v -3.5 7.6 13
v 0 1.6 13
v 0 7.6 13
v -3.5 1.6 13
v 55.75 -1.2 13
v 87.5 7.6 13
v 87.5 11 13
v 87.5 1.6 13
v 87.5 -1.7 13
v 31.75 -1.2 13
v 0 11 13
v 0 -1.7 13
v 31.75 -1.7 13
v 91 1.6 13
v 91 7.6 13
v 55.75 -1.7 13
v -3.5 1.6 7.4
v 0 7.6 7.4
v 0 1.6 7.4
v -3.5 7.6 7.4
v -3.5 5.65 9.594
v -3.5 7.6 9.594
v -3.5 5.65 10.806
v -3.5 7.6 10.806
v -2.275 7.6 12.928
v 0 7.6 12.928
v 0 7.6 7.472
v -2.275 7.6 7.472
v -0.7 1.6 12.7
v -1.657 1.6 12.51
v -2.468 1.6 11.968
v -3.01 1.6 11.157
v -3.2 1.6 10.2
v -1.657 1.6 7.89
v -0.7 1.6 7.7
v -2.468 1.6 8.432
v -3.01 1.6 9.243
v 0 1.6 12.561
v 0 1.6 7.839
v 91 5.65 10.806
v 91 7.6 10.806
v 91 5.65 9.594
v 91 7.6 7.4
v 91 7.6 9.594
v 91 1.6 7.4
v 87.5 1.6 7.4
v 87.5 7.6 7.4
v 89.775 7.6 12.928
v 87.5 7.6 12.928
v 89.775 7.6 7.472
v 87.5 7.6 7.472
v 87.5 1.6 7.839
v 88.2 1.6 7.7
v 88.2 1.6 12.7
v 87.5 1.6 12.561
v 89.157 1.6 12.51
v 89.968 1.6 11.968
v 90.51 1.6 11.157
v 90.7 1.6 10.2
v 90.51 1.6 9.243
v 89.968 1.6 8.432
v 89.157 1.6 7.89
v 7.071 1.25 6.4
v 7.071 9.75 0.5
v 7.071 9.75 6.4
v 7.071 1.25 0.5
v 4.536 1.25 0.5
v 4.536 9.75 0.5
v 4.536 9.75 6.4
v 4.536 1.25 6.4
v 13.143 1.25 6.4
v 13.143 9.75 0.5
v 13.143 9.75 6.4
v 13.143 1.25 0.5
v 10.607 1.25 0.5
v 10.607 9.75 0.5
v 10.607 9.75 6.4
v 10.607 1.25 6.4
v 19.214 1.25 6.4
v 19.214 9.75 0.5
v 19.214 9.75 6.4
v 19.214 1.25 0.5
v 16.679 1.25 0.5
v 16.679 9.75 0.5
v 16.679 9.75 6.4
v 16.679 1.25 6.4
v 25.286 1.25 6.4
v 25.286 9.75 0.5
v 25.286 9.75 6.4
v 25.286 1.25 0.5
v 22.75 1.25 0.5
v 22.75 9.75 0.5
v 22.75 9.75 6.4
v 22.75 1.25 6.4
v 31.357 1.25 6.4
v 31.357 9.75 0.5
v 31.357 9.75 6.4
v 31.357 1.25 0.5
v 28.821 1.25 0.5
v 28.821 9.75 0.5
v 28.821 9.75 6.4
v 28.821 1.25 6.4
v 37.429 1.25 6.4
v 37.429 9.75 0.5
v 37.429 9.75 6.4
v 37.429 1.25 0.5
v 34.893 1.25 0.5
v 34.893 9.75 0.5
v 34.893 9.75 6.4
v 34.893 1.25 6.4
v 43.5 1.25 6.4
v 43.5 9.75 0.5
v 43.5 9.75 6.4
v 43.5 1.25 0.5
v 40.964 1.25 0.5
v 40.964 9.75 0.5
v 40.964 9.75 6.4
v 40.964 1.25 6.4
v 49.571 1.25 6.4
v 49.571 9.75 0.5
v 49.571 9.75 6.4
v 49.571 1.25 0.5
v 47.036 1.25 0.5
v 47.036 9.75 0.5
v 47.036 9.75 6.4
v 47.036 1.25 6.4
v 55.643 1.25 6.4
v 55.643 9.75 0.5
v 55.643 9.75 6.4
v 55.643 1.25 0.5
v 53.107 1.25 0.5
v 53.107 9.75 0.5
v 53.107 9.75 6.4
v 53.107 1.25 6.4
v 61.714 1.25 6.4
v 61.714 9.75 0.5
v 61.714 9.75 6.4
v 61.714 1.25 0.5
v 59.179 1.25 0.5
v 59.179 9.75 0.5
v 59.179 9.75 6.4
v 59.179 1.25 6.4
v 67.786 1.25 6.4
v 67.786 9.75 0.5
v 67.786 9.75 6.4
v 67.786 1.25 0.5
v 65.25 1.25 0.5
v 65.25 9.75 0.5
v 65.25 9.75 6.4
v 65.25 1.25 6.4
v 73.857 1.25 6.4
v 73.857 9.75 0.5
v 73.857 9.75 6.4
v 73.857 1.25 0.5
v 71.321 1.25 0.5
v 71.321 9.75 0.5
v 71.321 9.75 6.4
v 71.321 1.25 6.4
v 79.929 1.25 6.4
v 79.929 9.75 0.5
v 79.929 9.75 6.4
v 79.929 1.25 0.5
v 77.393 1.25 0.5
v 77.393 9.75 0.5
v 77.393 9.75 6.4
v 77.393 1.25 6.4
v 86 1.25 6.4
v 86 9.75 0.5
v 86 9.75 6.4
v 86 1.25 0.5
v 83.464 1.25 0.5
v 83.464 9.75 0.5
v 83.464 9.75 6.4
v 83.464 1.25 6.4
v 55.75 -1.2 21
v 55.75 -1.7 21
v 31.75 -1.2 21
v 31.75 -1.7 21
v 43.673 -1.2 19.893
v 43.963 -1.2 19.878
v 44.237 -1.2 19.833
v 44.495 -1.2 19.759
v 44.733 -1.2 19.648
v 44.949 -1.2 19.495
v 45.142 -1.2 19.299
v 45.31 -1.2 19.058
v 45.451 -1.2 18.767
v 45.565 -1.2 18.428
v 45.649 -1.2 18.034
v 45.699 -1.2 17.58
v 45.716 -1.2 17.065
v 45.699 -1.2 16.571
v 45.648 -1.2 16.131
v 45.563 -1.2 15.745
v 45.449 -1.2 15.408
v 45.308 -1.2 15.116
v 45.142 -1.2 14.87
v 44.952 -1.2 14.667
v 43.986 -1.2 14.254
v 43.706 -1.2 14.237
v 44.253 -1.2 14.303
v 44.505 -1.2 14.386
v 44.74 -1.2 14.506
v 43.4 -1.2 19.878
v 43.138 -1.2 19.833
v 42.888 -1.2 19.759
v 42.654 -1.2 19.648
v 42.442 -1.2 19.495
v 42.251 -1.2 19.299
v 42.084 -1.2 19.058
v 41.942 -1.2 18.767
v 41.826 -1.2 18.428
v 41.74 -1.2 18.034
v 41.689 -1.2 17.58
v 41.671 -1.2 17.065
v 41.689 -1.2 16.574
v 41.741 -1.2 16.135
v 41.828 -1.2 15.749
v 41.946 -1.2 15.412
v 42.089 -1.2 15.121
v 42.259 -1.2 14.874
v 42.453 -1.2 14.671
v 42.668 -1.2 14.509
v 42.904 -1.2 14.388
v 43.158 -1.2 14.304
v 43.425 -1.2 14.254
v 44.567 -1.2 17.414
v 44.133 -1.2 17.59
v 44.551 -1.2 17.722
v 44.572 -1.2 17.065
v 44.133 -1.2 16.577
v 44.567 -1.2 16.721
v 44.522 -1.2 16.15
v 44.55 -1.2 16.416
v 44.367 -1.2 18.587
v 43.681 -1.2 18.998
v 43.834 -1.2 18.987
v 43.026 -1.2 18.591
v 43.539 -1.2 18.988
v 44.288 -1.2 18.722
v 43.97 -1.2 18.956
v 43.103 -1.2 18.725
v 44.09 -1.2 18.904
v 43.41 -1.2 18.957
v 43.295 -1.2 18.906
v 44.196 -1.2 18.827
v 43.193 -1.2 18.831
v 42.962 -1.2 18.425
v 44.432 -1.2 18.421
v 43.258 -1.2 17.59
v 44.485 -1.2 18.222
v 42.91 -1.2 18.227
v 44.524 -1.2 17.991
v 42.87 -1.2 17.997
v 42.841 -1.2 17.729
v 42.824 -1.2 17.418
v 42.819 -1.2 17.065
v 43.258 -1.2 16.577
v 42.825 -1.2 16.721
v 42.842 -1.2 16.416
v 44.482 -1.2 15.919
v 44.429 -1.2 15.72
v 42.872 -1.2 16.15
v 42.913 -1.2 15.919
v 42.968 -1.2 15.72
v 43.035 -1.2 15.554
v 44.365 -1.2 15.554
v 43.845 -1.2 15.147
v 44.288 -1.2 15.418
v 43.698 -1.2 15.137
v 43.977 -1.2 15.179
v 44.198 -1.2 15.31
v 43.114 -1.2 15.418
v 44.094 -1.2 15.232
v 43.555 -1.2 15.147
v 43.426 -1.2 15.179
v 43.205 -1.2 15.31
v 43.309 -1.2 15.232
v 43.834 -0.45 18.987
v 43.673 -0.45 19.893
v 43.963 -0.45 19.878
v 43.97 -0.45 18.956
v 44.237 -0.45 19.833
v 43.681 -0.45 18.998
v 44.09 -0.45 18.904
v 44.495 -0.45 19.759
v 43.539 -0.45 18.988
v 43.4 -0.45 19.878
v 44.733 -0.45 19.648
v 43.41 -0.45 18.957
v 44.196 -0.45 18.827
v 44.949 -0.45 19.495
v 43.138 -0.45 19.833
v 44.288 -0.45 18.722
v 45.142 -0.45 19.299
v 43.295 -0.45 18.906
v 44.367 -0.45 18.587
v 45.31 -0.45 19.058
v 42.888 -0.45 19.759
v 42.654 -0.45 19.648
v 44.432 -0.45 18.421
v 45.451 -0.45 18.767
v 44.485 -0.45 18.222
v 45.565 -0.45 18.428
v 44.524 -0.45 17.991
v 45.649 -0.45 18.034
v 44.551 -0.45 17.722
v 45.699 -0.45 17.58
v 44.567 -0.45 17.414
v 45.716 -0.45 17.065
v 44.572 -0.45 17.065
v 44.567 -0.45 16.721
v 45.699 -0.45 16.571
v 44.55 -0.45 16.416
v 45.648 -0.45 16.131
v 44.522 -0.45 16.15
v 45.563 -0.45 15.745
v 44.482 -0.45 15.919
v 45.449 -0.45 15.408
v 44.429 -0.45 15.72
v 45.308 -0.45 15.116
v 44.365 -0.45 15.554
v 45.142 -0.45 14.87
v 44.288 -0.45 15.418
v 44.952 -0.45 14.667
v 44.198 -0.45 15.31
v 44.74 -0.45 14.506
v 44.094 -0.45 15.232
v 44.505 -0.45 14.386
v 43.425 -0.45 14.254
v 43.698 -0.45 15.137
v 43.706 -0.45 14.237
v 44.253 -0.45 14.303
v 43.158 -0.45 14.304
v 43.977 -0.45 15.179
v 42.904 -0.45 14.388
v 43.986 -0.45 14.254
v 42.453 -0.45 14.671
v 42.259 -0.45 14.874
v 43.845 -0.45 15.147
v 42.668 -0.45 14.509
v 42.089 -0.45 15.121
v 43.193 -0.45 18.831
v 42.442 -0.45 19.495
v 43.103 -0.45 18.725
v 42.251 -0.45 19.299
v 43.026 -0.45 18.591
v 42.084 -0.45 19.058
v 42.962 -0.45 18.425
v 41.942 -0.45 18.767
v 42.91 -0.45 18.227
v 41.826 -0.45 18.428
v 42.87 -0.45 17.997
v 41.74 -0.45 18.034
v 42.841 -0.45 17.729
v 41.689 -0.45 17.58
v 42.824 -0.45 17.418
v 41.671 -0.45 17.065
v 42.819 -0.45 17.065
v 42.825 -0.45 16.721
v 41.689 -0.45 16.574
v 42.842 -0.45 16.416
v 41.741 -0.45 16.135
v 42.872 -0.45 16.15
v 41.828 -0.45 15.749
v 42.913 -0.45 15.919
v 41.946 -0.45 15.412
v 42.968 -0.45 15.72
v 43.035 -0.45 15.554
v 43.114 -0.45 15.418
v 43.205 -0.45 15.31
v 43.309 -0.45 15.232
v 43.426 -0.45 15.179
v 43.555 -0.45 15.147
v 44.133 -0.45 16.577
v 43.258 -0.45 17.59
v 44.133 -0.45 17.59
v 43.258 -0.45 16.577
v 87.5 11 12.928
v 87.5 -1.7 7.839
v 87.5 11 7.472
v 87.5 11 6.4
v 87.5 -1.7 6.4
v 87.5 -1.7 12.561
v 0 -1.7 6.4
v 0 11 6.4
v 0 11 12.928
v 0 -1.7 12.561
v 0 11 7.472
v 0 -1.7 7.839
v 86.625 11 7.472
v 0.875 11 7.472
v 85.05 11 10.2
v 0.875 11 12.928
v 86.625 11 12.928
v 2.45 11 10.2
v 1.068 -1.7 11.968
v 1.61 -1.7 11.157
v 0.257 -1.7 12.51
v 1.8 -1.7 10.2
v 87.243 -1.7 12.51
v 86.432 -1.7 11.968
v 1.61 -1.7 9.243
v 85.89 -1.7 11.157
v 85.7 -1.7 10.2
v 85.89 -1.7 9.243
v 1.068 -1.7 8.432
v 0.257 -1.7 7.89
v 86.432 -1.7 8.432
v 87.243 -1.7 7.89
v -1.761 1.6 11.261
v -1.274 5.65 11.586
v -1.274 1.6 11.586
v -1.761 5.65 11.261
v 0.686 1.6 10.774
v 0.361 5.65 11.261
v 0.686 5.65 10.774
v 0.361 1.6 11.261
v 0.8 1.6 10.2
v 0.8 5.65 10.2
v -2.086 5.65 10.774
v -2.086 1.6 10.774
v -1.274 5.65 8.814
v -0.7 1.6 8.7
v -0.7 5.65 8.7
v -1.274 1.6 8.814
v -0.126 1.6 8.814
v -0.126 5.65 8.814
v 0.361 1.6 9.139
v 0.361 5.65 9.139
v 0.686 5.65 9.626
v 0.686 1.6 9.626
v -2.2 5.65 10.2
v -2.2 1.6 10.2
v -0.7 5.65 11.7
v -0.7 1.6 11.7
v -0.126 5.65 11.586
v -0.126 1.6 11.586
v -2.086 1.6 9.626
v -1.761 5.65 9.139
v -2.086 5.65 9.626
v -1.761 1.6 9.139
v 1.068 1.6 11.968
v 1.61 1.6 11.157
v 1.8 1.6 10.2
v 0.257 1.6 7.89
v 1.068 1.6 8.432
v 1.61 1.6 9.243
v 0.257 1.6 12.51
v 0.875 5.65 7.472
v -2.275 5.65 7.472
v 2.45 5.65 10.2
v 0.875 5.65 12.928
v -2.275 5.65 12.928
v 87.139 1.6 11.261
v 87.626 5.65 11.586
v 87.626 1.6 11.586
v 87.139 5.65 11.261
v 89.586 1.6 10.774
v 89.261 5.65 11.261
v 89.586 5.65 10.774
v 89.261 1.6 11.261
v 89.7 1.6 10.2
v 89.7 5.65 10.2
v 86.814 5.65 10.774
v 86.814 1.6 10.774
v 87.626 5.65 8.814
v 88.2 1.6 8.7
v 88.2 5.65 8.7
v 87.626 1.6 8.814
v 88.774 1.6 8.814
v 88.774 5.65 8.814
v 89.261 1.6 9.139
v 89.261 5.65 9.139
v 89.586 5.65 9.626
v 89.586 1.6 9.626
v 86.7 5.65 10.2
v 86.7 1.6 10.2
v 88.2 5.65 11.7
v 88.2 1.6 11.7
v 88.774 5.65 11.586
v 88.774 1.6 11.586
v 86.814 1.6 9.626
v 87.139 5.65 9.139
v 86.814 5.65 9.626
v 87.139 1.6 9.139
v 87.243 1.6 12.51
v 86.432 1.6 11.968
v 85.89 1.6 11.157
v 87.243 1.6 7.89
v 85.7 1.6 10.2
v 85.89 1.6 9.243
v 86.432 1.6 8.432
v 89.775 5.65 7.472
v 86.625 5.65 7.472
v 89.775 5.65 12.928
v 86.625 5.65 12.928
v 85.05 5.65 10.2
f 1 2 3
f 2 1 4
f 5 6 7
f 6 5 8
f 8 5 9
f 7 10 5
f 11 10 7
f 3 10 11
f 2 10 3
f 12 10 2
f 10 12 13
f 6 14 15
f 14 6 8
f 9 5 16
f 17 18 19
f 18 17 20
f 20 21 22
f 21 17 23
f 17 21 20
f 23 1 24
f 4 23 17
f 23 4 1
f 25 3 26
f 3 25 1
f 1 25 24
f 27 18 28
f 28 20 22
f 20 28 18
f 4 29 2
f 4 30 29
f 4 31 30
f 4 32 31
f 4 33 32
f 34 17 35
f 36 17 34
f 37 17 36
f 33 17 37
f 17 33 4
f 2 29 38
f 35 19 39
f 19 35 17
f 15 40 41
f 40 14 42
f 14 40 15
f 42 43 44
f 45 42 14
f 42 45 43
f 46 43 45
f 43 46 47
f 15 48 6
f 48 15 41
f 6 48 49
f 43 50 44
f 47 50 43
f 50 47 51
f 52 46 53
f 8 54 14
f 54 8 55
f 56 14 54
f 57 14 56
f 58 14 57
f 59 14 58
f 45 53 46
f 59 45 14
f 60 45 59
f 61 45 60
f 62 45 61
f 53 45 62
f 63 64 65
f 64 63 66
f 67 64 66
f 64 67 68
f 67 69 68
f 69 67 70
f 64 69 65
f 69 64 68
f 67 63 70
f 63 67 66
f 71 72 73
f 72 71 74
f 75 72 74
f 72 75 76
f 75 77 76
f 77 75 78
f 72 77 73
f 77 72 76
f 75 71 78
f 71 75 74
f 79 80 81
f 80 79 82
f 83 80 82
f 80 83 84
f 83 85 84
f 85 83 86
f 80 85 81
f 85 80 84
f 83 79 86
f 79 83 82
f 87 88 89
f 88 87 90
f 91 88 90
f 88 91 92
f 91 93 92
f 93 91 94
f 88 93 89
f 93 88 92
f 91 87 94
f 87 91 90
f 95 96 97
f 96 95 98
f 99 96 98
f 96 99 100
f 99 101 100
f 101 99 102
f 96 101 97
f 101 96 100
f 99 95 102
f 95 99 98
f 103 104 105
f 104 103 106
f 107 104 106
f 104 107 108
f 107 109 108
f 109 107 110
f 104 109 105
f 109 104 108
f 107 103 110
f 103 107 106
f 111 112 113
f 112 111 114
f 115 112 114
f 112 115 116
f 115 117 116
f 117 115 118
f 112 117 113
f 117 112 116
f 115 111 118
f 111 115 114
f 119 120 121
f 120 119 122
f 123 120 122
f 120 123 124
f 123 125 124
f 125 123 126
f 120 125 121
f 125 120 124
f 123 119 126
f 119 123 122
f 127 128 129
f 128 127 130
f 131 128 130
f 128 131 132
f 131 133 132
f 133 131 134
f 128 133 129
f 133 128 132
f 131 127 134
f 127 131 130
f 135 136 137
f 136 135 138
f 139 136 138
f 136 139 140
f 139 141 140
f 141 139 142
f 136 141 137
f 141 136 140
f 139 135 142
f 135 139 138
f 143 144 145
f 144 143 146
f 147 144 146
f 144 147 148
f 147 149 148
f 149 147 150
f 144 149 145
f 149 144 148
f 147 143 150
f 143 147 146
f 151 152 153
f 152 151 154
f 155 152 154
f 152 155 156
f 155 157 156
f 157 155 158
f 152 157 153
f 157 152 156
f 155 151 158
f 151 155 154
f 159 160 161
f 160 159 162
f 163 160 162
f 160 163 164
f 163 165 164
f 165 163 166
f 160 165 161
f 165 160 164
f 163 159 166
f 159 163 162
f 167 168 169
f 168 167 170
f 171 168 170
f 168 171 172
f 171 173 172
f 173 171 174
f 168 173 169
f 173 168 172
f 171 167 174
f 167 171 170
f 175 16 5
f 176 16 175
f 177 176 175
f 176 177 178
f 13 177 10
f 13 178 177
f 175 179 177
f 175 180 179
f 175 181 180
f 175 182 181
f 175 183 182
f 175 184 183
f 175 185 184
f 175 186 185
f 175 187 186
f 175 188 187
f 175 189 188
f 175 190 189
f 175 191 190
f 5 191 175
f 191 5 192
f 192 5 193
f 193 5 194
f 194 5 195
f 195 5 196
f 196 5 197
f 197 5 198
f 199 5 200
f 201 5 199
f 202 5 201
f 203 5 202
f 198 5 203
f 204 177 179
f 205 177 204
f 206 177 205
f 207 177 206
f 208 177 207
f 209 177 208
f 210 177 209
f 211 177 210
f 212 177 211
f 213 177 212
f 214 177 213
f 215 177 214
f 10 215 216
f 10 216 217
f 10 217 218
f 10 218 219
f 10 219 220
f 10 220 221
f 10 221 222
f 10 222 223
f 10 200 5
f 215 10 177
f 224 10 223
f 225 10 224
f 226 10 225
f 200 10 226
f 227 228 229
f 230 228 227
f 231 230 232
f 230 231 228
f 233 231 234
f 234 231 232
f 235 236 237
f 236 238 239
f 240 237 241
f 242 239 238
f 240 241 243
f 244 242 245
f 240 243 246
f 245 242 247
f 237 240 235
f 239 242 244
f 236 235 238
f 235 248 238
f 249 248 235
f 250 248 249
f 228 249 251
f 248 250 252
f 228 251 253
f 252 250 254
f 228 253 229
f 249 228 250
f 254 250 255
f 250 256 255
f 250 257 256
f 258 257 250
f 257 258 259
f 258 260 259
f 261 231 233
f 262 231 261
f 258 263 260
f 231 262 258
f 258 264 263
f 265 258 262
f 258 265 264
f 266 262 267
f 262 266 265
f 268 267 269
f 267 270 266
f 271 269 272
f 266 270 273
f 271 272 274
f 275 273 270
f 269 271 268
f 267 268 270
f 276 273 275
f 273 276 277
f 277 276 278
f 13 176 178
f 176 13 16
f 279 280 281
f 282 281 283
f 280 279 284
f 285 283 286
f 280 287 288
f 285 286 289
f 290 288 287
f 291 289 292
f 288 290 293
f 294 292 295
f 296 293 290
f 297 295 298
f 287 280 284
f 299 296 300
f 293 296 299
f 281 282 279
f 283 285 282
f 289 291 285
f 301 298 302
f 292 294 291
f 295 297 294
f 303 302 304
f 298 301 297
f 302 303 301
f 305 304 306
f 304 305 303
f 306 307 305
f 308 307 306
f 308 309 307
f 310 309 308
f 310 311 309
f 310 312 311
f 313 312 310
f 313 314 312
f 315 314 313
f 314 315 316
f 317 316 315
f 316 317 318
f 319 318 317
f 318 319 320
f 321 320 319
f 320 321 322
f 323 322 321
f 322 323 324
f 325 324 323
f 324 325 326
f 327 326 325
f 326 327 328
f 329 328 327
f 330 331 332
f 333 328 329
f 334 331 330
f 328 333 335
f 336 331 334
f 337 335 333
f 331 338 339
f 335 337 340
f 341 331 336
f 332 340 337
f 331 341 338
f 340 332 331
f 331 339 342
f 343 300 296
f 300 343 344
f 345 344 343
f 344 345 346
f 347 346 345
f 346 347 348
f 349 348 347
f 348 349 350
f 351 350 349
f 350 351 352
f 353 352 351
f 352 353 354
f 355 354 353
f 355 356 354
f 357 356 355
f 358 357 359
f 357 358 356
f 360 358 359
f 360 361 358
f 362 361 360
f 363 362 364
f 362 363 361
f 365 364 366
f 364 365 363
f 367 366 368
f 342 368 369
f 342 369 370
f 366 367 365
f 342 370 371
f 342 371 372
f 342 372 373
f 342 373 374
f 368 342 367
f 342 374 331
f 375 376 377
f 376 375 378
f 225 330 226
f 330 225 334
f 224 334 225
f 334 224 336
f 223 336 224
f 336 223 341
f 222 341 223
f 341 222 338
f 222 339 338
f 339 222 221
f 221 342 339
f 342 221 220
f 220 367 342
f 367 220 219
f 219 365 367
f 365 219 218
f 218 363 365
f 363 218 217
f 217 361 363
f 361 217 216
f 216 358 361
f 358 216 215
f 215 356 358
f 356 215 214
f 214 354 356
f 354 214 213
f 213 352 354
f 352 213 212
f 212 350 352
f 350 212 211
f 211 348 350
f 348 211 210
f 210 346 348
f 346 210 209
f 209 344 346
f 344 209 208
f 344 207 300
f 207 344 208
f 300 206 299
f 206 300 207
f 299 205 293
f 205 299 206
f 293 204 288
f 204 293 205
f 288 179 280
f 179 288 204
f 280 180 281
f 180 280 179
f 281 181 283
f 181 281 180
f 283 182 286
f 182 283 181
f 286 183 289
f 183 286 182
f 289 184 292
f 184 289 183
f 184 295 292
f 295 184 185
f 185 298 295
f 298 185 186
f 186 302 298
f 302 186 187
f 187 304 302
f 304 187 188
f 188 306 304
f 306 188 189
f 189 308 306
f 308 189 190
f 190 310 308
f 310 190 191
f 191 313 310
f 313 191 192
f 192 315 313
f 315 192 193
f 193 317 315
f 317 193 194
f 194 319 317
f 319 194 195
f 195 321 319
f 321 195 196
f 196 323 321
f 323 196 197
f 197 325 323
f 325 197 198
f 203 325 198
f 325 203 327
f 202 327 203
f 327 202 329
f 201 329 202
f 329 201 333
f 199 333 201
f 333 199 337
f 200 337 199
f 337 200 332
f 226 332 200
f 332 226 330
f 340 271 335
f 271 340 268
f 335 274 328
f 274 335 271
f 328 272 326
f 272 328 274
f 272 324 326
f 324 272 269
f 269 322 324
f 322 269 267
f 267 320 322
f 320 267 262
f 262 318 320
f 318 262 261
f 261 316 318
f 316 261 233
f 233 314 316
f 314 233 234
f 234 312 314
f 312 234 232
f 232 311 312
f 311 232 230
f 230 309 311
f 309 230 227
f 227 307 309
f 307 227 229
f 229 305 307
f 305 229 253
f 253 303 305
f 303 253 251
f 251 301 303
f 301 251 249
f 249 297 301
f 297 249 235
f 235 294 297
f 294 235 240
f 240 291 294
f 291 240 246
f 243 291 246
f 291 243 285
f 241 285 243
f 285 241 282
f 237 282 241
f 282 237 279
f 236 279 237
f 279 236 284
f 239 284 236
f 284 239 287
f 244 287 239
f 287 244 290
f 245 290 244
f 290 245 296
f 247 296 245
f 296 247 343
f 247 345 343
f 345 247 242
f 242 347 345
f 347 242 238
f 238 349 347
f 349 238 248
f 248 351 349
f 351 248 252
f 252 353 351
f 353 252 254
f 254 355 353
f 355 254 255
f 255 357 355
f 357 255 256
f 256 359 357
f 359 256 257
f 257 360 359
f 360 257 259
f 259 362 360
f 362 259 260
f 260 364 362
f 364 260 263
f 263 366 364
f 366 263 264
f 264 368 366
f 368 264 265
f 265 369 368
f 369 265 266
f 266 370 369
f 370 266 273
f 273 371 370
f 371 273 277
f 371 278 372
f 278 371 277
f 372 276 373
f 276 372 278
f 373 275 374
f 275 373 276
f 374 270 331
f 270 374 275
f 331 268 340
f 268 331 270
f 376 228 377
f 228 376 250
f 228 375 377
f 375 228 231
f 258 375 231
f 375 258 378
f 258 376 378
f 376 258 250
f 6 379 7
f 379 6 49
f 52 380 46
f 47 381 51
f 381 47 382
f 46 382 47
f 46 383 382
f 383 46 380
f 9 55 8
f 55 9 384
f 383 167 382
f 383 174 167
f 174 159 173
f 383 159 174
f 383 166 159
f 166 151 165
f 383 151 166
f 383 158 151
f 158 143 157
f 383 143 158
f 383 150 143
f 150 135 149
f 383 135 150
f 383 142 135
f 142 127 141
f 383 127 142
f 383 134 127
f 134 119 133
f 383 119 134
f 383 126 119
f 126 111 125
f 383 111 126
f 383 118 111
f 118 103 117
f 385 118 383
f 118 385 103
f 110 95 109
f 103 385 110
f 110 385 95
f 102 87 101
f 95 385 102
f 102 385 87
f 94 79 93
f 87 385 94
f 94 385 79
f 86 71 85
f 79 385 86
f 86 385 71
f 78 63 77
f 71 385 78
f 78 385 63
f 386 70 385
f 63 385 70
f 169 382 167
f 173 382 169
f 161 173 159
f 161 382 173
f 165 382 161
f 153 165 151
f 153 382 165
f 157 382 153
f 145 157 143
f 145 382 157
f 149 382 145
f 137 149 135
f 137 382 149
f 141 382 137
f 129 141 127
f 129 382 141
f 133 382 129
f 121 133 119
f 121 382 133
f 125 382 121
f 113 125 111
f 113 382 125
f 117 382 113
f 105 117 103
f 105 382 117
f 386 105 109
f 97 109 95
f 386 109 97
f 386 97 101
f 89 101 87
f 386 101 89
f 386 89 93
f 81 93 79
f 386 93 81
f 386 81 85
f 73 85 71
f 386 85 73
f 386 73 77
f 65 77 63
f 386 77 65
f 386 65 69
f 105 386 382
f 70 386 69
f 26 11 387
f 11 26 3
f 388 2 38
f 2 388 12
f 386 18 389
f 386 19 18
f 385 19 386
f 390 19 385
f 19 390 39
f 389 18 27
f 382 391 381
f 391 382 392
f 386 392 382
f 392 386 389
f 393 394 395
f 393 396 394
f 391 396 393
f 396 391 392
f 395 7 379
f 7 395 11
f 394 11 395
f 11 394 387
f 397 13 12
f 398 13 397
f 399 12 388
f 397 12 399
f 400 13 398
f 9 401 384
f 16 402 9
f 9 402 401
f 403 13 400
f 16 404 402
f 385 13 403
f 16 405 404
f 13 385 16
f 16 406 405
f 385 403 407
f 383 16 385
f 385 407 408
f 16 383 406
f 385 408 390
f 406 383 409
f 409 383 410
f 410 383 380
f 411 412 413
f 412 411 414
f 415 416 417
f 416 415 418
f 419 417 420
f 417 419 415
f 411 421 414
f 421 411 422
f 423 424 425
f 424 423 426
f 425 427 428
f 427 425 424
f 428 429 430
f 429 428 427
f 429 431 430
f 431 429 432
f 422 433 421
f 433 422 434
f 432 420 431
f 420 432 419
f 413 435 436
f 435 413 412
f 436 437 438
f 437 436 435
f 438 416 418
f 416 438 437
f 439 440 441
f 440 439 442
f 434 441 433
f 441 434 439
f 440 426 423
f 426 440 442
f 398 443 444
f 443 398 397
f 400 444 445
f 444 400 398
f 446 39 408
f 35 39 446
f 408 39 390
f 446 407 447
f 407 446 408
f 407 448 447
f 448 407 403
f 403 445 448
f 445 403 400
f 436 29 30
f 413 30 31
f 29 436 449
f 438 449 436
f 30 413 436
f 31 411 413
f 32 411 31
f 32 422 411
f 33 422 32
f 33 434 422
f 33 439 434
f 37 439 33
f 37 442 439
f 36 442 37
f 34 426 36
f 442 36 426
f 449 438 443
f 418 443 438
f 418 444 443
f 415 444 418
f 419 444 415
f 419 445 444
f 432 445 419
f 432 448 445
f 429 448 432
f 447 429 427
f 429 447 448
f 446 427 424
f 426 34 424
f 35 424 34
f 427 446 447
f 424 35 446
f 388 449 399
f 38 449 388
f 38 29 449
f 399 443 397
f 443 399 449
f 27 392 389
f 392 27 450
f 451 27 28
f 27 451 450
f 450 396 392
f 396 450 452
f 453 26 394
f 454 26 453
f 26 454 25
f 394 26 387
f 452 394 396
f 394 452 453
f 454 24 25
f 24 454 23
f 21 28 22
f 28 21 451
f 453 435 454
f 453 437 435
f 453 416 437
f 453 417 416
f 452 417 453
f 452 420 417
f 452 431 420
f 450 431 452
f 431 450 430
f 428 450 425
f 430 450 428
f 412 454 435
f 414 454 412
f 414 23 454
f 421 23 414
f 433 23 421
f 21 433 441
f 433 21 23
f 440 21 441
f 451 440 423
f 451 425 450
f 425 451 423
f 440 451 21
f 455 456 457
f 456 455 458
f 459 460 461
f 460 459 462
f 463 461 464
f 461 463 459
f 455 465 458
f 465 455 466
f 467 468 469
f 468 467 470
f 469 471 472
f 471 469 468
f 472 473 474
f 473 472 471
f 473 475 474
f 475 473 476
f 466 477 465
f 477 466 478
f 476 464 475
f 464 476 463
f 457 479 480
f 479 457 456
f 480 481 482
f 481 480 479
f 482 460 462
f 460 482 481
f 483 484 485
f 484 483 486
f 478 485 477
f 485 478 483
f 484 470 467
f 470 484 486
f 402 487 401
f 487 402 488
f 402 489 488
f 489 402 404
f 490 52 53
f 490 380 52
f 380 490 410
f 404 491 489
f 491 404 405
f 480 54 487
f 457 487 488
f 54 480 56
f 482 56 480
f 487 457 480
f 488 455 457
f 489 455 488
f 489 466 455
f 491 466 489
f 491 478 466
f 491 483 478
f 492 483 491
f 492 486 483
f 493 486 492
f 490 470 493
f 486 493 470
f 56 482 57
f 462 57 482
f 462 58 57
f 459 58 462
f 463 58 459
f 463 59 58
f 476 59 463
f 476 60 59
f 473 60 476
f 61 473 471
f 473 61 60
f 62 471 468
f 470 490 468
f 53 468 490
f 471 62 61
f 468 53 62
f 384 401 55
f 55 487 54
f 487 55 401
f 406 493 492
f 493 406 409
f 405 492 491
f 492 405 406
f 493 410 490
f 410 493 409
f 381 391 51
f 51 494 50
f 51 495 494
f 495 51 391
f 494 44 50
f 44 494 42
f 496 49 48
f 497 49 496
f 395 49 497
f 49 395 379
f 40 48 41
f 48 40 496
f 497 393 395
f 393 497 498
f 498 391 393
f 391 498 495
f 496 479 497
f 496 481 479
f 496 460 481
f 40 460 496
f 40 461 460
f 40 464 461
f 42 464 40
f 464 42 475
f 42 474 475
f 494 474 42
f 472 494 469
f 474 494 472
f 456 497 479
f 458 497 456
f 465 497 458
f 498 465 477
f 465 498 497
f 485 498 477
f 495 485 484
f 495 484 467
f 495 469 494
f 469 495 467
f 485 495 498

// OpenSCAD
// file: ../code/code.scad
// code stripes 
//
// to do:
// - convert code in bits using loop, if possible with scad
// - consider other forms than cubes (why not characters?)

include <code_dim.scad>

module code_label(code=0,type=0){
 code_str=str(code);   
 if(type==0)   
 cube([label_width,label_thick,label_height],center=true);            
 rotate([90,0,180])linear_extrude(height = label_text_thick) 
 text(code_str,
    font = "Courier:style=Bold",
    size=label_size,
    halign ="center",
    valign ="center");
}

module code_stripe(code=code,s=[100,8,10],inv=0){
       
 bit_x=s.x/code_n/2; // x dimension of half bit without pass considered   
    
 function bit(inv=0,bit=0,x=0)=(inv==0)
  ?bit_x*(2*x+bit+1/2)
  :bit_x*(((bit+1)%2)+2*x+1/2);  ;  
  
 function zpos(inv=0)=(inv==0)
  ?s.z/2-pass/2
  :s.z/2+pass/2;        
          
 function get_bit(x=0)=((x%2)==0)? 0:1;
 function get_rest(x=0)=floor(x/2);  
 function p(x)=pow(2,x);
 
 // since variables can not be overwritten in OpenSCAD as required in lops 
 // individual variables per bits are created     
 d13=floor((code                                                                                                                )/p(13));
 d12=floor((code-d13*p(13)                                                                                                      )/p(12));     
 d11=floor((code-d13*p(13)-d12*p(12)                                                                                            )/p(11));         
 d10=floor((code-d13*p(13)-d12*p(12)-d11*p(11)                                                                                  )/p(10));
 d9 =floor((code-d13*p(13)-d12*p(12)-d11*p(11)-d10*p(10)                                                                        )/p(9));          
 d8 =floor((code-d13*p(13)-d12*p(12)-d11*p(11)-d10*p(10)-d9*p(9)                                                                )/p(8));       
 d7 =floor((code-d13*p(13)-d12*p(12)-d11*p(11)-d10*p(10)-d9*p(9)-d8*p(8)                                                        )/p(7));    
 d6 =floor((code-d13*p(13)-d12*p(12)-d11*p(11)-d10*p(10)-d9*p(9)-d8*p(8)-d7*p(7)                                                )/p(6));     
 d5 =floor((code-d13*p(13)-d12*p(12)-d11*p(11)-d10*p(10)-d9*p(9)-d8*p(8)-d7*p(7)-d6*p(6)                                        )/p(5));          
 d4 =floor((code-d13*p(13)-d12*p(12)-d11*p(11)-d10*p(10)-d9*p(9)-d8*p(8)-d7*p(7)-d6*p(6)-d5*p(5)                                )/p(4));       
 d3 =floor((code-d13*p(13)-d12*p(12)-d11*p(11)-d10*p(10)-d9*p(9)-d8*p(8)-d7*p(7)-d6*p(6)-d5*p(5)-d4*p(4)                        )/p(3));   
 d2 =floor((code-d13*p(13)-d12*p(12)-d11*p(11)-d10*p(10)-d9*p(9)-d8*p(8)-d7*p(7)-d6*p(6)-d5*p(5)-d4*p(4)-d3*p(3)                )/p(2));        
 d1 =floor((code-d13*p(13)-d12*p(12)-d11*p(11)-d10*p(10)-d9*p(9)-d8*p(8)-d7*p(7)-d6*p(6)-d5*p(5)-d4*p(4)-d3*p(3)-d2*p(2)        )/p(1));   
 d0 =floor((code-d13*p(13)-d12*p(12)-d11*p(11)-d10*p(10)-d9*p(9)-d8*p(8)-d7*p(7)-d6*p(6)-d5*p(5)-d4*p(4)-d3*p(3)-d2*p(2)-d1*p(1))/p(0));   

 d=[d0,d1,d2,d3,d4,d5,d6,d7,d8,d9,d10,d11,d12,d13];
       
 for (x = [ 0 : code_n - 1 ]) {    
    translate([bit(inv,d[x],x),
                   0,
                   zpos(inv)])
    
    cube([bit_x-pass, 
              s.y,
              s.z-pass],
             center=true);    // coded bits
      
    if(       ((d[x]==0)&&(d[x-1]==1)&&(inv==0))  
           ||  ((d[x]==1)&&(d[x-1]==0)&&(inv==1))  )
        {
          translate([x*bit_x*2,
                        0,
                        zpos(inv)])
          cube([pass*2,s.y,s.z-pass],center=true);  // fillers for not necessary pass gaps
    }
 }    
}

//
code=218;
//code=0;
//code=pow(2,code_n)-1;
s=[100,8,10];

//
color("Red")
code_stripe(code=code,s=s,inv=0);
//
color("Blue")
code_stripe(code=code,s=s,inv=1);

//translate([0,0,20])code_label(code=code,type=1);
// file: ../linurs/linurs_screw.scad
// Metric screws and nuts 
// urs@linurs.org 2019
// It is targeted for 3D printing applications. 
// To look realistic is not the goal (Example: Nuts do not have a hole)

include <linurs_screw_dim.scad>

// Changes
//2019-02-09 split in two files
//2017-05-19 bug fix hexbolt had wrong diameter
//2017-01-22 bug fix lentgh of hex scre is outer lenght as other screw types
//2017-01-06 added hex screw
//2015-10-12 added screw_cut
//2015-11-29 screw_fix parameter sunk added, and module hex_bolt

// Consistent parameters in this file
// d screw diameter M2_5, M3, ... (enumeration with screw_d)
// t millimeters added to diameters 
//   For the screw, head, nut = 0. 
//   For the piece where the screw, nut, ... passes through = 0.5 so it slides in well

// functions used multiple times to position nuts and heads
function headh_cyl(d)=screw_cyl[d][1];  // height of cyl screw head
function headh_cnt(d)=screw_cyl[d][1];  // height of cnt screw head
function headh(d,type=head_cyl)=(type==head_cyl ? headh_cyl(d) : (type==head_cnt ? headh_cnt(d) : 0 )); // height of screw head 

function nuth(d)=screw_hex[d][2];   // height of hex nut

// head of a cylinder screw
module screw_head_cyl(d=M3, t=0)
{
  screwhd=screw_cyl[d][0]+t; // diameter of cylinder screw head
  cylinder(d=screwhd,h=headh(d=d, type=head_cyl), center=true,$fn=16); // screw head
}

// head of a countersunk screw
module screw_head_cnt(d=M3, t=0)
{
  screwd=screw_d[d]+t; 
  screwhd=screw_cnt[d][0]+t; // diameter of cylinder screw head
  cylinder(d1=screwd,d2=screwhd,h=headh(d=d,type=head_cnt), center=true,$fn=16); // screw head
}

// head of a hex screw
module screw_head_hex(d=M3, t=0)
{
    translate([0,0,-nuth(d)/2])nut(d=d, t=t);
}

// head of all screws
module screw_head(d=M3, type=head_cyl, t=0)
{ 
  if(type==head_cnt){
    screw_head_cnt(d=d, t=t);
  } else {
    if(type==head_cyl){
      screw_head_cyl(d=d, t=t);
    } else {
       if(type==head_hex){
           screw_head_hex(d=d, t=t); 
       } 
    }    
  }
}

// hex bolt 
module hex_bolt(d=M3, h=10, t=0)
{
  nutd=screw_hex[d][1]+t; // outer diameter of hex bolt
  cylinder(r=nutd/2,h=h+t, center=true,$fn=6); // nut
}

// nut 
module nut(d=M3, t=0)
{
  hex_bolt(d=d, h=nuth(d), t=t);    
}

// screw 
// w outer width of the screw = screw length + head 
module screw(w=10, d=M3, type=head_cyl, t=0){
  screwd=screw_d[d]+t;       // screw diameter
  cylinder(d=screwd, h=w, center=true,$fn=16); // screw thread length
  translate([0,0,w/2-headh(d=d,type=type)/2])
  screw_head(d=d,type=type, t=t);
}

// screw fix
// w outer width of the screw = screw length + head 
// sink additional material below to remove 
// raise additional material above to remove
module screw_fix(w=10, d=M3, type=head_cyl, sink=0, raise=0, t=0){
  screw(w=w-sink*2, d=d, type=type, t=t);
  translate([0,0,-(w-sink*2)/2+nuth(d)/2])
    nut(d=d,t=t);
  //additional material to be removed above the nut  
  translate([0,0,-(w-sink+raise)/2])hex_bolt(d=d,h=sink+raise+0.01,t=t);    
  //additional material to be removed above the screw head
  if(type==head_cnt){  
    translate([0,0,(w-sink+raise)/2])
    cylinder(d=screw_cnt[d][0]+t,h=sink+raise+0.01,center=true,$fn=16);
  }else{ 
    translate([0,0,(w-sink+raise)/2])
    cylinder(d=screw_cyl[d][0]+t,h=sink+raise+0.01,center=true,$fn=16);
  }     
}
//screw_fix();
//translate([10,0,0])screw_fix(sink=2,type=head_cnt);
//

// screw cut
// material to be extracted from object to slide in a counter sunk screw for fixation
// w height of the cut out
// i depth of the screw
module screw_cut(d=M3,w=20,i=10,t=0,fn=32){
    hsh=screw_cnt[d][1];
    ws=screw_cnt[d][0]+t;
    ds=screw_d[d]+t;
    
    translate([i/2,0,-(w-hsh)/2])
      cube([i,ws,hsh],center=true);
    
    translate([0,0,-(w-hsh)/2])
      cylinder(d=ws,h=hsh,center=true,$fn=32);
    
    translate([0,0,-(w-hsh)/2+hsh])
        cylinder(d2=ds, d1=ws, h=hsh,center=true,$fn=fn);
    
    cylinder(h=w, d=ds, center=true, $fn=fn);   
    
    translate([i/2,0,0]) 
        cube([i,ds,w],center=true);
    
    for(y=[-1,1]){
        translate([i/2,y*ds/2,-w/2+hsh])
            rotate([45,0,0])
            cube([i,sqrt(2)*(ws-ds)/2,sqrt(2)*(ws-ds)/2],center=true);
    }
}
//screw_cut();

// nut cut
// material to be extracted from object to slide in a nut for fixation
// w height of the cylinder
// i lenght of the inlet
module nut_cut(w=10, wi=0, d=M3, i=10, t=0, raise=0, type=head_cyl){ 
  nut(d,t);
  translate([i/2,0,0])
    cube([i,screw_hex[d][0]+t,nuth(d)+t],center=true);
  translate([0,0,-wi])
      if(type==head_cnt){    
          screw(w=w, d=d, type=type, t=t); 
        translate([0,0,(w+raise)/2-0.01])
          cylinder(d=screw_cnt[d][0]+t,h=raise,center=true,$fn=16);
      }else{ 
          screw(w=w, d=d, type=type, t=t);   
        translate([0,0,(w+raise)/2-0.01])
          cylinder(d=screw_cyl[d][0]+t,h=raise,center=true,$fn=16);
      }       
}
//nut_cut(raise=2,type=head_cnt,i=14,w=20,wi=2, t=1);

// present the library
show=1;

if(show==1){
    grid=20;
    
    for (j=[0:10]){
        for (i=[0:3])
           translate([j*grid,i*grid,0]){  
           
    // elements           
           if(j==0){
             screw_fix(w=(i+2)*5,d=i, type=head_cyl, t=0);
           }
       
           if(j==1){
             nut(d=i,t=0);
           } 
       
           if(j==2){   
              screw(d=i,t=0);
           } 
           
           if(j==3){   
              screw(d=i,t=0,type=head_cnt);
           } 
           
           if(j==4){   
              screw(d=i,t=0,type=head_hex);
           } 
           
           if(j==5){   
              hex_bolt(d=i,t=0);
           } 
           
       }
    }   
     
    for (j=[0:2]){
        for (i=[0:3])
           translate([j*grid,-(i+1)*grid,0]){  
             difference(){
                cube([3*screw_d[i],3*screw_d[i],(i+2)*5-0.1],center=true);    
    
                if(j==0){
                  screw_fix(w=(i+2)*5,d=i,type=head_cnt, t=0.5);
                }   
                
                if(j==1){
                  nut_cut(d=i,w=(i+2)*5);
                }
                if(j==2){
                  screw_cut(d=1,w=(i+2)*5);
                }
            
             }
           }  
        
    }
}
   
// file: ../linurs/linurs_screw_dim.scad
// Metric screws and nuts 
// urs@linurs.org 2015

// contains dimensions of linurs_screw and can be included in other 
// OpenScad files 


// Consistent parameters in this file
// d screw diameter M2_5, M3, ... (enumeration with screw_d)
// t millimeters added to diameters 
//   For the screw, head, nut = 0. 
//   For the piece where the screw, nut, ... passes through = 0.5 so it slides in well

// enumerations of metric threads
M2_5=0;
M3=1;
M4=2;
M5=3;

// enumerations screw head type
head_cyl=0; // cylinder
head_cnt=1; // countrsunk
head_no=2;  // no head at all
head_hex=3;  // no head at all

// screw diameters
screw_d=[
2.5, // M2.5
3.0, // M3
4.0, // M4
5.0  // M5
];

// sizes for hex nuts
screw_hex=[
//   s,   e,   h
 [ 5.0, 5.8, 1.7], // M2.5
 [ 5.5, 6.4, 2.0], // M3
 [ 7.0, 8.1, 2.8], // M4
 [ 8.0, 9.2, 3.5]  // M5
];

// sizes for cylinder screw heads
screw_cyl=[
//   d,   h
 [ 4.5, 1.6], // M2.5
 [ 5.5, 2.0], // M3
 [ 7.0, 2.6], // M4
 [ 8.5, 3.3]  // M5
];

// sizes for countersunk screw heads
screw_cnt=[
//   d,   h
 [ 4.7, 1.50], // M2.5
 [ 5.6, 1.65], // M3
 [ 7.4, 2.20], // M4
 [ 9.2, 2.50]  // M5
];
// file: ../code/code_dim.scad
// codings
code_n=14;  // number of bits
pass=0.5; // gap between the code stripes

// label for the code
label_width=24;
label_thick=0.5;
label_size=6;
label_text_thick=1;
label_height=label_size+2;
// file: connector_dim.scad
// connector
// Connector to be mounted on pcb of the modules

pcb_thick=1.6;

con_w=87.5;   // width of connector bodywithout flanges of mounting holes 
con_d=2.8;    // diameter of mounting holes
con_d_w=88.9; // distance between mounting holes
con_m_h=6;    // height of mounting cube
con_h=13;     // largest z dimension

pcb_d_h=10.2;  // ???

// connector dimensions
motherboard_con_head_w=85;  // width of the connector head
motherboard_con_head_d=8.5; // depth of the connector head
motherboard_con_w=95;       // largest width of the connector
motherboard_con_h=11.6;     // largest height of the connector
motherboard_con_t=11;       // largest depth of the connector
motherboard_con_d_w=90;     // distance between mounting holes
motherboard_con_d=2.8;      // diameter of mounting holes
motherboard_con_out=5.2;    // height produced by the connector when pulgged in 

// pcb module connector dimension
pcbmodule_con_out=13-(5.3+2.8-2.54);  // distance connector sticks out of pcb

// for codings
//code=2157;
//code_n=14;
//code_l=motherboard_con_head_w/code_n/2;
//
//label_width=24;
//label_thick=0.5;
//label_size=6;
//label_text_thick=1;
//label_height=label_size+2;
//pass=0.5;
// file: connector.scad
// - rename connector to male_connector
// - translate male connector and rotate (should as to be used for PCB)
include <connector_dim.scad>
include <../code/code_dim.scad>
include <../linurs/linurs_screw_dim.scad>

use <../linurs/linurs_screw.scad>
use <../code/code.scad>

module motherboard_con(type=0,code=0){ //,label=0){
  //color("LightGrey")
  difference(){
    union(){
      if(type==0){  
        translate([0,0,motherboard_con_h/2])
          cube([motherboard_con_head_w,
              motherboard_con_head_d,
              motherboard_con_h],
              center=true);  // upper body of the connector down to motherboard level
      }    
      translate([0,0,motherboard_con_out/2])
        cube([motherboard_con_w,
              motherboard_con_t,
              motherboard_con_out],
              center=true); // lower body of the connector laying on mother board  
      if(type==2){
          translate([-motherboard_con_head_w/2,0,0])
        code_stripe(code=code,s=[motherboard_con_head_w,motherboard_con_head_d,motherboard_con_h],inv=0); 
      }    
    }
    for(i=[-1,1]){ // mounting holes
      translate([i*motherboard_con_d_w/2,0, motherboard_con_out/2])
      screw(w=motherboard_con_out+0.1, d=M2_5, type=head_cyl, t=1);
    }
    if(type==2){  // add label
     translate([0,0, label_text_thick-0.01])rotate([-90,0,0])
       code_label(code=code, type=1);  // label
    }
  }
}

//motherboard_con();
//translate([0,20,0])motherboard_con(type=1);
//translate([0,40,0])
//motherboard_con(type=2,code=d, code_str=str(code));

module connector(type=0,code=0, step=25.4){
  echo("connector");
     
  coding_height=motherboard_con_h-motherboard_con_out;   
  spacer_t=step/2-motherboard_con_t;  
  function get_thick(type=0)=(type==1)? spacer_t+pcb_thick:0; 
    
  difference(){
    union(){// add material  
         
      translate([con_w/2,
        (pcb_thick+motherboard_con_t-get_thick(type))/2,
        (coding_height+con_h)/2])  
        cube([con_w,
            motherboard_con_t-pcb_thick+get_thick(type),
          con_h-coding_height
        ],center=true); // main body of the connector
        
      for(x=[(con_w-con_d_w)/2,con_w+(con_d_w-con_w)/2]){ // add the two brackets
        translate([x,con_m_h/2+pcb_thick,pcb_d_h])
          cube([2*con_d,
                con_m_h,
                2*con_d],center=true);   
      }

      if(type==0){
      translate([
             con_w/2,
             motherboard_con_t/2,
             coding_height/2])
      cube([
            con_w,
            motherboard_con_t,
            coding_height],center=true);  
      }
      
      if(type==1){
             translate([
                           (con_w-motherboard_con_head_w)/2,               
                           motherboard_con_t/2,
                           0])
               code_stripe(code=code,
                   s=[motherboard_con_head_w,motherboard_con_head_d,con_h], inv=1); 
        
        translate([con_w/2,
                   label_thick/2+pcb_thick-get_thick(type),
                   con_h-coding_height+coding_height+label_height/2])
                   code_label(code=code);             
      }      
    }    
    
    for(x=[(con_w-con_d_w)/2,con_w+(con_d_w-con_w)/2]){
      translate([x,con_m_h/2+pcb_thick/2,pcb_d_h])
      rotate([90,0,0])
        screw_fix(w=con_m_h+pcb_thick, d=M2_5, type=head_cyl, sink=0, raise=con_m_h, t=0.5);
    }
  }
}

//code=12;
// code minuimum
//code=0;
// code maximum
//
code=pow(2,code_n)-1;

translate([0,
                 motherboard_con_t/2,
                 -motherboard_con_out  ])
motherboard_con(type=2,code=code);

 translate([-con_w/2,
                  0,
                  0])  
connector(type=1,code=code);
// main file
// file to be called at command line to produce coded connectors
use <connector.scad>

code=0;

connector(type=1,code=code);
